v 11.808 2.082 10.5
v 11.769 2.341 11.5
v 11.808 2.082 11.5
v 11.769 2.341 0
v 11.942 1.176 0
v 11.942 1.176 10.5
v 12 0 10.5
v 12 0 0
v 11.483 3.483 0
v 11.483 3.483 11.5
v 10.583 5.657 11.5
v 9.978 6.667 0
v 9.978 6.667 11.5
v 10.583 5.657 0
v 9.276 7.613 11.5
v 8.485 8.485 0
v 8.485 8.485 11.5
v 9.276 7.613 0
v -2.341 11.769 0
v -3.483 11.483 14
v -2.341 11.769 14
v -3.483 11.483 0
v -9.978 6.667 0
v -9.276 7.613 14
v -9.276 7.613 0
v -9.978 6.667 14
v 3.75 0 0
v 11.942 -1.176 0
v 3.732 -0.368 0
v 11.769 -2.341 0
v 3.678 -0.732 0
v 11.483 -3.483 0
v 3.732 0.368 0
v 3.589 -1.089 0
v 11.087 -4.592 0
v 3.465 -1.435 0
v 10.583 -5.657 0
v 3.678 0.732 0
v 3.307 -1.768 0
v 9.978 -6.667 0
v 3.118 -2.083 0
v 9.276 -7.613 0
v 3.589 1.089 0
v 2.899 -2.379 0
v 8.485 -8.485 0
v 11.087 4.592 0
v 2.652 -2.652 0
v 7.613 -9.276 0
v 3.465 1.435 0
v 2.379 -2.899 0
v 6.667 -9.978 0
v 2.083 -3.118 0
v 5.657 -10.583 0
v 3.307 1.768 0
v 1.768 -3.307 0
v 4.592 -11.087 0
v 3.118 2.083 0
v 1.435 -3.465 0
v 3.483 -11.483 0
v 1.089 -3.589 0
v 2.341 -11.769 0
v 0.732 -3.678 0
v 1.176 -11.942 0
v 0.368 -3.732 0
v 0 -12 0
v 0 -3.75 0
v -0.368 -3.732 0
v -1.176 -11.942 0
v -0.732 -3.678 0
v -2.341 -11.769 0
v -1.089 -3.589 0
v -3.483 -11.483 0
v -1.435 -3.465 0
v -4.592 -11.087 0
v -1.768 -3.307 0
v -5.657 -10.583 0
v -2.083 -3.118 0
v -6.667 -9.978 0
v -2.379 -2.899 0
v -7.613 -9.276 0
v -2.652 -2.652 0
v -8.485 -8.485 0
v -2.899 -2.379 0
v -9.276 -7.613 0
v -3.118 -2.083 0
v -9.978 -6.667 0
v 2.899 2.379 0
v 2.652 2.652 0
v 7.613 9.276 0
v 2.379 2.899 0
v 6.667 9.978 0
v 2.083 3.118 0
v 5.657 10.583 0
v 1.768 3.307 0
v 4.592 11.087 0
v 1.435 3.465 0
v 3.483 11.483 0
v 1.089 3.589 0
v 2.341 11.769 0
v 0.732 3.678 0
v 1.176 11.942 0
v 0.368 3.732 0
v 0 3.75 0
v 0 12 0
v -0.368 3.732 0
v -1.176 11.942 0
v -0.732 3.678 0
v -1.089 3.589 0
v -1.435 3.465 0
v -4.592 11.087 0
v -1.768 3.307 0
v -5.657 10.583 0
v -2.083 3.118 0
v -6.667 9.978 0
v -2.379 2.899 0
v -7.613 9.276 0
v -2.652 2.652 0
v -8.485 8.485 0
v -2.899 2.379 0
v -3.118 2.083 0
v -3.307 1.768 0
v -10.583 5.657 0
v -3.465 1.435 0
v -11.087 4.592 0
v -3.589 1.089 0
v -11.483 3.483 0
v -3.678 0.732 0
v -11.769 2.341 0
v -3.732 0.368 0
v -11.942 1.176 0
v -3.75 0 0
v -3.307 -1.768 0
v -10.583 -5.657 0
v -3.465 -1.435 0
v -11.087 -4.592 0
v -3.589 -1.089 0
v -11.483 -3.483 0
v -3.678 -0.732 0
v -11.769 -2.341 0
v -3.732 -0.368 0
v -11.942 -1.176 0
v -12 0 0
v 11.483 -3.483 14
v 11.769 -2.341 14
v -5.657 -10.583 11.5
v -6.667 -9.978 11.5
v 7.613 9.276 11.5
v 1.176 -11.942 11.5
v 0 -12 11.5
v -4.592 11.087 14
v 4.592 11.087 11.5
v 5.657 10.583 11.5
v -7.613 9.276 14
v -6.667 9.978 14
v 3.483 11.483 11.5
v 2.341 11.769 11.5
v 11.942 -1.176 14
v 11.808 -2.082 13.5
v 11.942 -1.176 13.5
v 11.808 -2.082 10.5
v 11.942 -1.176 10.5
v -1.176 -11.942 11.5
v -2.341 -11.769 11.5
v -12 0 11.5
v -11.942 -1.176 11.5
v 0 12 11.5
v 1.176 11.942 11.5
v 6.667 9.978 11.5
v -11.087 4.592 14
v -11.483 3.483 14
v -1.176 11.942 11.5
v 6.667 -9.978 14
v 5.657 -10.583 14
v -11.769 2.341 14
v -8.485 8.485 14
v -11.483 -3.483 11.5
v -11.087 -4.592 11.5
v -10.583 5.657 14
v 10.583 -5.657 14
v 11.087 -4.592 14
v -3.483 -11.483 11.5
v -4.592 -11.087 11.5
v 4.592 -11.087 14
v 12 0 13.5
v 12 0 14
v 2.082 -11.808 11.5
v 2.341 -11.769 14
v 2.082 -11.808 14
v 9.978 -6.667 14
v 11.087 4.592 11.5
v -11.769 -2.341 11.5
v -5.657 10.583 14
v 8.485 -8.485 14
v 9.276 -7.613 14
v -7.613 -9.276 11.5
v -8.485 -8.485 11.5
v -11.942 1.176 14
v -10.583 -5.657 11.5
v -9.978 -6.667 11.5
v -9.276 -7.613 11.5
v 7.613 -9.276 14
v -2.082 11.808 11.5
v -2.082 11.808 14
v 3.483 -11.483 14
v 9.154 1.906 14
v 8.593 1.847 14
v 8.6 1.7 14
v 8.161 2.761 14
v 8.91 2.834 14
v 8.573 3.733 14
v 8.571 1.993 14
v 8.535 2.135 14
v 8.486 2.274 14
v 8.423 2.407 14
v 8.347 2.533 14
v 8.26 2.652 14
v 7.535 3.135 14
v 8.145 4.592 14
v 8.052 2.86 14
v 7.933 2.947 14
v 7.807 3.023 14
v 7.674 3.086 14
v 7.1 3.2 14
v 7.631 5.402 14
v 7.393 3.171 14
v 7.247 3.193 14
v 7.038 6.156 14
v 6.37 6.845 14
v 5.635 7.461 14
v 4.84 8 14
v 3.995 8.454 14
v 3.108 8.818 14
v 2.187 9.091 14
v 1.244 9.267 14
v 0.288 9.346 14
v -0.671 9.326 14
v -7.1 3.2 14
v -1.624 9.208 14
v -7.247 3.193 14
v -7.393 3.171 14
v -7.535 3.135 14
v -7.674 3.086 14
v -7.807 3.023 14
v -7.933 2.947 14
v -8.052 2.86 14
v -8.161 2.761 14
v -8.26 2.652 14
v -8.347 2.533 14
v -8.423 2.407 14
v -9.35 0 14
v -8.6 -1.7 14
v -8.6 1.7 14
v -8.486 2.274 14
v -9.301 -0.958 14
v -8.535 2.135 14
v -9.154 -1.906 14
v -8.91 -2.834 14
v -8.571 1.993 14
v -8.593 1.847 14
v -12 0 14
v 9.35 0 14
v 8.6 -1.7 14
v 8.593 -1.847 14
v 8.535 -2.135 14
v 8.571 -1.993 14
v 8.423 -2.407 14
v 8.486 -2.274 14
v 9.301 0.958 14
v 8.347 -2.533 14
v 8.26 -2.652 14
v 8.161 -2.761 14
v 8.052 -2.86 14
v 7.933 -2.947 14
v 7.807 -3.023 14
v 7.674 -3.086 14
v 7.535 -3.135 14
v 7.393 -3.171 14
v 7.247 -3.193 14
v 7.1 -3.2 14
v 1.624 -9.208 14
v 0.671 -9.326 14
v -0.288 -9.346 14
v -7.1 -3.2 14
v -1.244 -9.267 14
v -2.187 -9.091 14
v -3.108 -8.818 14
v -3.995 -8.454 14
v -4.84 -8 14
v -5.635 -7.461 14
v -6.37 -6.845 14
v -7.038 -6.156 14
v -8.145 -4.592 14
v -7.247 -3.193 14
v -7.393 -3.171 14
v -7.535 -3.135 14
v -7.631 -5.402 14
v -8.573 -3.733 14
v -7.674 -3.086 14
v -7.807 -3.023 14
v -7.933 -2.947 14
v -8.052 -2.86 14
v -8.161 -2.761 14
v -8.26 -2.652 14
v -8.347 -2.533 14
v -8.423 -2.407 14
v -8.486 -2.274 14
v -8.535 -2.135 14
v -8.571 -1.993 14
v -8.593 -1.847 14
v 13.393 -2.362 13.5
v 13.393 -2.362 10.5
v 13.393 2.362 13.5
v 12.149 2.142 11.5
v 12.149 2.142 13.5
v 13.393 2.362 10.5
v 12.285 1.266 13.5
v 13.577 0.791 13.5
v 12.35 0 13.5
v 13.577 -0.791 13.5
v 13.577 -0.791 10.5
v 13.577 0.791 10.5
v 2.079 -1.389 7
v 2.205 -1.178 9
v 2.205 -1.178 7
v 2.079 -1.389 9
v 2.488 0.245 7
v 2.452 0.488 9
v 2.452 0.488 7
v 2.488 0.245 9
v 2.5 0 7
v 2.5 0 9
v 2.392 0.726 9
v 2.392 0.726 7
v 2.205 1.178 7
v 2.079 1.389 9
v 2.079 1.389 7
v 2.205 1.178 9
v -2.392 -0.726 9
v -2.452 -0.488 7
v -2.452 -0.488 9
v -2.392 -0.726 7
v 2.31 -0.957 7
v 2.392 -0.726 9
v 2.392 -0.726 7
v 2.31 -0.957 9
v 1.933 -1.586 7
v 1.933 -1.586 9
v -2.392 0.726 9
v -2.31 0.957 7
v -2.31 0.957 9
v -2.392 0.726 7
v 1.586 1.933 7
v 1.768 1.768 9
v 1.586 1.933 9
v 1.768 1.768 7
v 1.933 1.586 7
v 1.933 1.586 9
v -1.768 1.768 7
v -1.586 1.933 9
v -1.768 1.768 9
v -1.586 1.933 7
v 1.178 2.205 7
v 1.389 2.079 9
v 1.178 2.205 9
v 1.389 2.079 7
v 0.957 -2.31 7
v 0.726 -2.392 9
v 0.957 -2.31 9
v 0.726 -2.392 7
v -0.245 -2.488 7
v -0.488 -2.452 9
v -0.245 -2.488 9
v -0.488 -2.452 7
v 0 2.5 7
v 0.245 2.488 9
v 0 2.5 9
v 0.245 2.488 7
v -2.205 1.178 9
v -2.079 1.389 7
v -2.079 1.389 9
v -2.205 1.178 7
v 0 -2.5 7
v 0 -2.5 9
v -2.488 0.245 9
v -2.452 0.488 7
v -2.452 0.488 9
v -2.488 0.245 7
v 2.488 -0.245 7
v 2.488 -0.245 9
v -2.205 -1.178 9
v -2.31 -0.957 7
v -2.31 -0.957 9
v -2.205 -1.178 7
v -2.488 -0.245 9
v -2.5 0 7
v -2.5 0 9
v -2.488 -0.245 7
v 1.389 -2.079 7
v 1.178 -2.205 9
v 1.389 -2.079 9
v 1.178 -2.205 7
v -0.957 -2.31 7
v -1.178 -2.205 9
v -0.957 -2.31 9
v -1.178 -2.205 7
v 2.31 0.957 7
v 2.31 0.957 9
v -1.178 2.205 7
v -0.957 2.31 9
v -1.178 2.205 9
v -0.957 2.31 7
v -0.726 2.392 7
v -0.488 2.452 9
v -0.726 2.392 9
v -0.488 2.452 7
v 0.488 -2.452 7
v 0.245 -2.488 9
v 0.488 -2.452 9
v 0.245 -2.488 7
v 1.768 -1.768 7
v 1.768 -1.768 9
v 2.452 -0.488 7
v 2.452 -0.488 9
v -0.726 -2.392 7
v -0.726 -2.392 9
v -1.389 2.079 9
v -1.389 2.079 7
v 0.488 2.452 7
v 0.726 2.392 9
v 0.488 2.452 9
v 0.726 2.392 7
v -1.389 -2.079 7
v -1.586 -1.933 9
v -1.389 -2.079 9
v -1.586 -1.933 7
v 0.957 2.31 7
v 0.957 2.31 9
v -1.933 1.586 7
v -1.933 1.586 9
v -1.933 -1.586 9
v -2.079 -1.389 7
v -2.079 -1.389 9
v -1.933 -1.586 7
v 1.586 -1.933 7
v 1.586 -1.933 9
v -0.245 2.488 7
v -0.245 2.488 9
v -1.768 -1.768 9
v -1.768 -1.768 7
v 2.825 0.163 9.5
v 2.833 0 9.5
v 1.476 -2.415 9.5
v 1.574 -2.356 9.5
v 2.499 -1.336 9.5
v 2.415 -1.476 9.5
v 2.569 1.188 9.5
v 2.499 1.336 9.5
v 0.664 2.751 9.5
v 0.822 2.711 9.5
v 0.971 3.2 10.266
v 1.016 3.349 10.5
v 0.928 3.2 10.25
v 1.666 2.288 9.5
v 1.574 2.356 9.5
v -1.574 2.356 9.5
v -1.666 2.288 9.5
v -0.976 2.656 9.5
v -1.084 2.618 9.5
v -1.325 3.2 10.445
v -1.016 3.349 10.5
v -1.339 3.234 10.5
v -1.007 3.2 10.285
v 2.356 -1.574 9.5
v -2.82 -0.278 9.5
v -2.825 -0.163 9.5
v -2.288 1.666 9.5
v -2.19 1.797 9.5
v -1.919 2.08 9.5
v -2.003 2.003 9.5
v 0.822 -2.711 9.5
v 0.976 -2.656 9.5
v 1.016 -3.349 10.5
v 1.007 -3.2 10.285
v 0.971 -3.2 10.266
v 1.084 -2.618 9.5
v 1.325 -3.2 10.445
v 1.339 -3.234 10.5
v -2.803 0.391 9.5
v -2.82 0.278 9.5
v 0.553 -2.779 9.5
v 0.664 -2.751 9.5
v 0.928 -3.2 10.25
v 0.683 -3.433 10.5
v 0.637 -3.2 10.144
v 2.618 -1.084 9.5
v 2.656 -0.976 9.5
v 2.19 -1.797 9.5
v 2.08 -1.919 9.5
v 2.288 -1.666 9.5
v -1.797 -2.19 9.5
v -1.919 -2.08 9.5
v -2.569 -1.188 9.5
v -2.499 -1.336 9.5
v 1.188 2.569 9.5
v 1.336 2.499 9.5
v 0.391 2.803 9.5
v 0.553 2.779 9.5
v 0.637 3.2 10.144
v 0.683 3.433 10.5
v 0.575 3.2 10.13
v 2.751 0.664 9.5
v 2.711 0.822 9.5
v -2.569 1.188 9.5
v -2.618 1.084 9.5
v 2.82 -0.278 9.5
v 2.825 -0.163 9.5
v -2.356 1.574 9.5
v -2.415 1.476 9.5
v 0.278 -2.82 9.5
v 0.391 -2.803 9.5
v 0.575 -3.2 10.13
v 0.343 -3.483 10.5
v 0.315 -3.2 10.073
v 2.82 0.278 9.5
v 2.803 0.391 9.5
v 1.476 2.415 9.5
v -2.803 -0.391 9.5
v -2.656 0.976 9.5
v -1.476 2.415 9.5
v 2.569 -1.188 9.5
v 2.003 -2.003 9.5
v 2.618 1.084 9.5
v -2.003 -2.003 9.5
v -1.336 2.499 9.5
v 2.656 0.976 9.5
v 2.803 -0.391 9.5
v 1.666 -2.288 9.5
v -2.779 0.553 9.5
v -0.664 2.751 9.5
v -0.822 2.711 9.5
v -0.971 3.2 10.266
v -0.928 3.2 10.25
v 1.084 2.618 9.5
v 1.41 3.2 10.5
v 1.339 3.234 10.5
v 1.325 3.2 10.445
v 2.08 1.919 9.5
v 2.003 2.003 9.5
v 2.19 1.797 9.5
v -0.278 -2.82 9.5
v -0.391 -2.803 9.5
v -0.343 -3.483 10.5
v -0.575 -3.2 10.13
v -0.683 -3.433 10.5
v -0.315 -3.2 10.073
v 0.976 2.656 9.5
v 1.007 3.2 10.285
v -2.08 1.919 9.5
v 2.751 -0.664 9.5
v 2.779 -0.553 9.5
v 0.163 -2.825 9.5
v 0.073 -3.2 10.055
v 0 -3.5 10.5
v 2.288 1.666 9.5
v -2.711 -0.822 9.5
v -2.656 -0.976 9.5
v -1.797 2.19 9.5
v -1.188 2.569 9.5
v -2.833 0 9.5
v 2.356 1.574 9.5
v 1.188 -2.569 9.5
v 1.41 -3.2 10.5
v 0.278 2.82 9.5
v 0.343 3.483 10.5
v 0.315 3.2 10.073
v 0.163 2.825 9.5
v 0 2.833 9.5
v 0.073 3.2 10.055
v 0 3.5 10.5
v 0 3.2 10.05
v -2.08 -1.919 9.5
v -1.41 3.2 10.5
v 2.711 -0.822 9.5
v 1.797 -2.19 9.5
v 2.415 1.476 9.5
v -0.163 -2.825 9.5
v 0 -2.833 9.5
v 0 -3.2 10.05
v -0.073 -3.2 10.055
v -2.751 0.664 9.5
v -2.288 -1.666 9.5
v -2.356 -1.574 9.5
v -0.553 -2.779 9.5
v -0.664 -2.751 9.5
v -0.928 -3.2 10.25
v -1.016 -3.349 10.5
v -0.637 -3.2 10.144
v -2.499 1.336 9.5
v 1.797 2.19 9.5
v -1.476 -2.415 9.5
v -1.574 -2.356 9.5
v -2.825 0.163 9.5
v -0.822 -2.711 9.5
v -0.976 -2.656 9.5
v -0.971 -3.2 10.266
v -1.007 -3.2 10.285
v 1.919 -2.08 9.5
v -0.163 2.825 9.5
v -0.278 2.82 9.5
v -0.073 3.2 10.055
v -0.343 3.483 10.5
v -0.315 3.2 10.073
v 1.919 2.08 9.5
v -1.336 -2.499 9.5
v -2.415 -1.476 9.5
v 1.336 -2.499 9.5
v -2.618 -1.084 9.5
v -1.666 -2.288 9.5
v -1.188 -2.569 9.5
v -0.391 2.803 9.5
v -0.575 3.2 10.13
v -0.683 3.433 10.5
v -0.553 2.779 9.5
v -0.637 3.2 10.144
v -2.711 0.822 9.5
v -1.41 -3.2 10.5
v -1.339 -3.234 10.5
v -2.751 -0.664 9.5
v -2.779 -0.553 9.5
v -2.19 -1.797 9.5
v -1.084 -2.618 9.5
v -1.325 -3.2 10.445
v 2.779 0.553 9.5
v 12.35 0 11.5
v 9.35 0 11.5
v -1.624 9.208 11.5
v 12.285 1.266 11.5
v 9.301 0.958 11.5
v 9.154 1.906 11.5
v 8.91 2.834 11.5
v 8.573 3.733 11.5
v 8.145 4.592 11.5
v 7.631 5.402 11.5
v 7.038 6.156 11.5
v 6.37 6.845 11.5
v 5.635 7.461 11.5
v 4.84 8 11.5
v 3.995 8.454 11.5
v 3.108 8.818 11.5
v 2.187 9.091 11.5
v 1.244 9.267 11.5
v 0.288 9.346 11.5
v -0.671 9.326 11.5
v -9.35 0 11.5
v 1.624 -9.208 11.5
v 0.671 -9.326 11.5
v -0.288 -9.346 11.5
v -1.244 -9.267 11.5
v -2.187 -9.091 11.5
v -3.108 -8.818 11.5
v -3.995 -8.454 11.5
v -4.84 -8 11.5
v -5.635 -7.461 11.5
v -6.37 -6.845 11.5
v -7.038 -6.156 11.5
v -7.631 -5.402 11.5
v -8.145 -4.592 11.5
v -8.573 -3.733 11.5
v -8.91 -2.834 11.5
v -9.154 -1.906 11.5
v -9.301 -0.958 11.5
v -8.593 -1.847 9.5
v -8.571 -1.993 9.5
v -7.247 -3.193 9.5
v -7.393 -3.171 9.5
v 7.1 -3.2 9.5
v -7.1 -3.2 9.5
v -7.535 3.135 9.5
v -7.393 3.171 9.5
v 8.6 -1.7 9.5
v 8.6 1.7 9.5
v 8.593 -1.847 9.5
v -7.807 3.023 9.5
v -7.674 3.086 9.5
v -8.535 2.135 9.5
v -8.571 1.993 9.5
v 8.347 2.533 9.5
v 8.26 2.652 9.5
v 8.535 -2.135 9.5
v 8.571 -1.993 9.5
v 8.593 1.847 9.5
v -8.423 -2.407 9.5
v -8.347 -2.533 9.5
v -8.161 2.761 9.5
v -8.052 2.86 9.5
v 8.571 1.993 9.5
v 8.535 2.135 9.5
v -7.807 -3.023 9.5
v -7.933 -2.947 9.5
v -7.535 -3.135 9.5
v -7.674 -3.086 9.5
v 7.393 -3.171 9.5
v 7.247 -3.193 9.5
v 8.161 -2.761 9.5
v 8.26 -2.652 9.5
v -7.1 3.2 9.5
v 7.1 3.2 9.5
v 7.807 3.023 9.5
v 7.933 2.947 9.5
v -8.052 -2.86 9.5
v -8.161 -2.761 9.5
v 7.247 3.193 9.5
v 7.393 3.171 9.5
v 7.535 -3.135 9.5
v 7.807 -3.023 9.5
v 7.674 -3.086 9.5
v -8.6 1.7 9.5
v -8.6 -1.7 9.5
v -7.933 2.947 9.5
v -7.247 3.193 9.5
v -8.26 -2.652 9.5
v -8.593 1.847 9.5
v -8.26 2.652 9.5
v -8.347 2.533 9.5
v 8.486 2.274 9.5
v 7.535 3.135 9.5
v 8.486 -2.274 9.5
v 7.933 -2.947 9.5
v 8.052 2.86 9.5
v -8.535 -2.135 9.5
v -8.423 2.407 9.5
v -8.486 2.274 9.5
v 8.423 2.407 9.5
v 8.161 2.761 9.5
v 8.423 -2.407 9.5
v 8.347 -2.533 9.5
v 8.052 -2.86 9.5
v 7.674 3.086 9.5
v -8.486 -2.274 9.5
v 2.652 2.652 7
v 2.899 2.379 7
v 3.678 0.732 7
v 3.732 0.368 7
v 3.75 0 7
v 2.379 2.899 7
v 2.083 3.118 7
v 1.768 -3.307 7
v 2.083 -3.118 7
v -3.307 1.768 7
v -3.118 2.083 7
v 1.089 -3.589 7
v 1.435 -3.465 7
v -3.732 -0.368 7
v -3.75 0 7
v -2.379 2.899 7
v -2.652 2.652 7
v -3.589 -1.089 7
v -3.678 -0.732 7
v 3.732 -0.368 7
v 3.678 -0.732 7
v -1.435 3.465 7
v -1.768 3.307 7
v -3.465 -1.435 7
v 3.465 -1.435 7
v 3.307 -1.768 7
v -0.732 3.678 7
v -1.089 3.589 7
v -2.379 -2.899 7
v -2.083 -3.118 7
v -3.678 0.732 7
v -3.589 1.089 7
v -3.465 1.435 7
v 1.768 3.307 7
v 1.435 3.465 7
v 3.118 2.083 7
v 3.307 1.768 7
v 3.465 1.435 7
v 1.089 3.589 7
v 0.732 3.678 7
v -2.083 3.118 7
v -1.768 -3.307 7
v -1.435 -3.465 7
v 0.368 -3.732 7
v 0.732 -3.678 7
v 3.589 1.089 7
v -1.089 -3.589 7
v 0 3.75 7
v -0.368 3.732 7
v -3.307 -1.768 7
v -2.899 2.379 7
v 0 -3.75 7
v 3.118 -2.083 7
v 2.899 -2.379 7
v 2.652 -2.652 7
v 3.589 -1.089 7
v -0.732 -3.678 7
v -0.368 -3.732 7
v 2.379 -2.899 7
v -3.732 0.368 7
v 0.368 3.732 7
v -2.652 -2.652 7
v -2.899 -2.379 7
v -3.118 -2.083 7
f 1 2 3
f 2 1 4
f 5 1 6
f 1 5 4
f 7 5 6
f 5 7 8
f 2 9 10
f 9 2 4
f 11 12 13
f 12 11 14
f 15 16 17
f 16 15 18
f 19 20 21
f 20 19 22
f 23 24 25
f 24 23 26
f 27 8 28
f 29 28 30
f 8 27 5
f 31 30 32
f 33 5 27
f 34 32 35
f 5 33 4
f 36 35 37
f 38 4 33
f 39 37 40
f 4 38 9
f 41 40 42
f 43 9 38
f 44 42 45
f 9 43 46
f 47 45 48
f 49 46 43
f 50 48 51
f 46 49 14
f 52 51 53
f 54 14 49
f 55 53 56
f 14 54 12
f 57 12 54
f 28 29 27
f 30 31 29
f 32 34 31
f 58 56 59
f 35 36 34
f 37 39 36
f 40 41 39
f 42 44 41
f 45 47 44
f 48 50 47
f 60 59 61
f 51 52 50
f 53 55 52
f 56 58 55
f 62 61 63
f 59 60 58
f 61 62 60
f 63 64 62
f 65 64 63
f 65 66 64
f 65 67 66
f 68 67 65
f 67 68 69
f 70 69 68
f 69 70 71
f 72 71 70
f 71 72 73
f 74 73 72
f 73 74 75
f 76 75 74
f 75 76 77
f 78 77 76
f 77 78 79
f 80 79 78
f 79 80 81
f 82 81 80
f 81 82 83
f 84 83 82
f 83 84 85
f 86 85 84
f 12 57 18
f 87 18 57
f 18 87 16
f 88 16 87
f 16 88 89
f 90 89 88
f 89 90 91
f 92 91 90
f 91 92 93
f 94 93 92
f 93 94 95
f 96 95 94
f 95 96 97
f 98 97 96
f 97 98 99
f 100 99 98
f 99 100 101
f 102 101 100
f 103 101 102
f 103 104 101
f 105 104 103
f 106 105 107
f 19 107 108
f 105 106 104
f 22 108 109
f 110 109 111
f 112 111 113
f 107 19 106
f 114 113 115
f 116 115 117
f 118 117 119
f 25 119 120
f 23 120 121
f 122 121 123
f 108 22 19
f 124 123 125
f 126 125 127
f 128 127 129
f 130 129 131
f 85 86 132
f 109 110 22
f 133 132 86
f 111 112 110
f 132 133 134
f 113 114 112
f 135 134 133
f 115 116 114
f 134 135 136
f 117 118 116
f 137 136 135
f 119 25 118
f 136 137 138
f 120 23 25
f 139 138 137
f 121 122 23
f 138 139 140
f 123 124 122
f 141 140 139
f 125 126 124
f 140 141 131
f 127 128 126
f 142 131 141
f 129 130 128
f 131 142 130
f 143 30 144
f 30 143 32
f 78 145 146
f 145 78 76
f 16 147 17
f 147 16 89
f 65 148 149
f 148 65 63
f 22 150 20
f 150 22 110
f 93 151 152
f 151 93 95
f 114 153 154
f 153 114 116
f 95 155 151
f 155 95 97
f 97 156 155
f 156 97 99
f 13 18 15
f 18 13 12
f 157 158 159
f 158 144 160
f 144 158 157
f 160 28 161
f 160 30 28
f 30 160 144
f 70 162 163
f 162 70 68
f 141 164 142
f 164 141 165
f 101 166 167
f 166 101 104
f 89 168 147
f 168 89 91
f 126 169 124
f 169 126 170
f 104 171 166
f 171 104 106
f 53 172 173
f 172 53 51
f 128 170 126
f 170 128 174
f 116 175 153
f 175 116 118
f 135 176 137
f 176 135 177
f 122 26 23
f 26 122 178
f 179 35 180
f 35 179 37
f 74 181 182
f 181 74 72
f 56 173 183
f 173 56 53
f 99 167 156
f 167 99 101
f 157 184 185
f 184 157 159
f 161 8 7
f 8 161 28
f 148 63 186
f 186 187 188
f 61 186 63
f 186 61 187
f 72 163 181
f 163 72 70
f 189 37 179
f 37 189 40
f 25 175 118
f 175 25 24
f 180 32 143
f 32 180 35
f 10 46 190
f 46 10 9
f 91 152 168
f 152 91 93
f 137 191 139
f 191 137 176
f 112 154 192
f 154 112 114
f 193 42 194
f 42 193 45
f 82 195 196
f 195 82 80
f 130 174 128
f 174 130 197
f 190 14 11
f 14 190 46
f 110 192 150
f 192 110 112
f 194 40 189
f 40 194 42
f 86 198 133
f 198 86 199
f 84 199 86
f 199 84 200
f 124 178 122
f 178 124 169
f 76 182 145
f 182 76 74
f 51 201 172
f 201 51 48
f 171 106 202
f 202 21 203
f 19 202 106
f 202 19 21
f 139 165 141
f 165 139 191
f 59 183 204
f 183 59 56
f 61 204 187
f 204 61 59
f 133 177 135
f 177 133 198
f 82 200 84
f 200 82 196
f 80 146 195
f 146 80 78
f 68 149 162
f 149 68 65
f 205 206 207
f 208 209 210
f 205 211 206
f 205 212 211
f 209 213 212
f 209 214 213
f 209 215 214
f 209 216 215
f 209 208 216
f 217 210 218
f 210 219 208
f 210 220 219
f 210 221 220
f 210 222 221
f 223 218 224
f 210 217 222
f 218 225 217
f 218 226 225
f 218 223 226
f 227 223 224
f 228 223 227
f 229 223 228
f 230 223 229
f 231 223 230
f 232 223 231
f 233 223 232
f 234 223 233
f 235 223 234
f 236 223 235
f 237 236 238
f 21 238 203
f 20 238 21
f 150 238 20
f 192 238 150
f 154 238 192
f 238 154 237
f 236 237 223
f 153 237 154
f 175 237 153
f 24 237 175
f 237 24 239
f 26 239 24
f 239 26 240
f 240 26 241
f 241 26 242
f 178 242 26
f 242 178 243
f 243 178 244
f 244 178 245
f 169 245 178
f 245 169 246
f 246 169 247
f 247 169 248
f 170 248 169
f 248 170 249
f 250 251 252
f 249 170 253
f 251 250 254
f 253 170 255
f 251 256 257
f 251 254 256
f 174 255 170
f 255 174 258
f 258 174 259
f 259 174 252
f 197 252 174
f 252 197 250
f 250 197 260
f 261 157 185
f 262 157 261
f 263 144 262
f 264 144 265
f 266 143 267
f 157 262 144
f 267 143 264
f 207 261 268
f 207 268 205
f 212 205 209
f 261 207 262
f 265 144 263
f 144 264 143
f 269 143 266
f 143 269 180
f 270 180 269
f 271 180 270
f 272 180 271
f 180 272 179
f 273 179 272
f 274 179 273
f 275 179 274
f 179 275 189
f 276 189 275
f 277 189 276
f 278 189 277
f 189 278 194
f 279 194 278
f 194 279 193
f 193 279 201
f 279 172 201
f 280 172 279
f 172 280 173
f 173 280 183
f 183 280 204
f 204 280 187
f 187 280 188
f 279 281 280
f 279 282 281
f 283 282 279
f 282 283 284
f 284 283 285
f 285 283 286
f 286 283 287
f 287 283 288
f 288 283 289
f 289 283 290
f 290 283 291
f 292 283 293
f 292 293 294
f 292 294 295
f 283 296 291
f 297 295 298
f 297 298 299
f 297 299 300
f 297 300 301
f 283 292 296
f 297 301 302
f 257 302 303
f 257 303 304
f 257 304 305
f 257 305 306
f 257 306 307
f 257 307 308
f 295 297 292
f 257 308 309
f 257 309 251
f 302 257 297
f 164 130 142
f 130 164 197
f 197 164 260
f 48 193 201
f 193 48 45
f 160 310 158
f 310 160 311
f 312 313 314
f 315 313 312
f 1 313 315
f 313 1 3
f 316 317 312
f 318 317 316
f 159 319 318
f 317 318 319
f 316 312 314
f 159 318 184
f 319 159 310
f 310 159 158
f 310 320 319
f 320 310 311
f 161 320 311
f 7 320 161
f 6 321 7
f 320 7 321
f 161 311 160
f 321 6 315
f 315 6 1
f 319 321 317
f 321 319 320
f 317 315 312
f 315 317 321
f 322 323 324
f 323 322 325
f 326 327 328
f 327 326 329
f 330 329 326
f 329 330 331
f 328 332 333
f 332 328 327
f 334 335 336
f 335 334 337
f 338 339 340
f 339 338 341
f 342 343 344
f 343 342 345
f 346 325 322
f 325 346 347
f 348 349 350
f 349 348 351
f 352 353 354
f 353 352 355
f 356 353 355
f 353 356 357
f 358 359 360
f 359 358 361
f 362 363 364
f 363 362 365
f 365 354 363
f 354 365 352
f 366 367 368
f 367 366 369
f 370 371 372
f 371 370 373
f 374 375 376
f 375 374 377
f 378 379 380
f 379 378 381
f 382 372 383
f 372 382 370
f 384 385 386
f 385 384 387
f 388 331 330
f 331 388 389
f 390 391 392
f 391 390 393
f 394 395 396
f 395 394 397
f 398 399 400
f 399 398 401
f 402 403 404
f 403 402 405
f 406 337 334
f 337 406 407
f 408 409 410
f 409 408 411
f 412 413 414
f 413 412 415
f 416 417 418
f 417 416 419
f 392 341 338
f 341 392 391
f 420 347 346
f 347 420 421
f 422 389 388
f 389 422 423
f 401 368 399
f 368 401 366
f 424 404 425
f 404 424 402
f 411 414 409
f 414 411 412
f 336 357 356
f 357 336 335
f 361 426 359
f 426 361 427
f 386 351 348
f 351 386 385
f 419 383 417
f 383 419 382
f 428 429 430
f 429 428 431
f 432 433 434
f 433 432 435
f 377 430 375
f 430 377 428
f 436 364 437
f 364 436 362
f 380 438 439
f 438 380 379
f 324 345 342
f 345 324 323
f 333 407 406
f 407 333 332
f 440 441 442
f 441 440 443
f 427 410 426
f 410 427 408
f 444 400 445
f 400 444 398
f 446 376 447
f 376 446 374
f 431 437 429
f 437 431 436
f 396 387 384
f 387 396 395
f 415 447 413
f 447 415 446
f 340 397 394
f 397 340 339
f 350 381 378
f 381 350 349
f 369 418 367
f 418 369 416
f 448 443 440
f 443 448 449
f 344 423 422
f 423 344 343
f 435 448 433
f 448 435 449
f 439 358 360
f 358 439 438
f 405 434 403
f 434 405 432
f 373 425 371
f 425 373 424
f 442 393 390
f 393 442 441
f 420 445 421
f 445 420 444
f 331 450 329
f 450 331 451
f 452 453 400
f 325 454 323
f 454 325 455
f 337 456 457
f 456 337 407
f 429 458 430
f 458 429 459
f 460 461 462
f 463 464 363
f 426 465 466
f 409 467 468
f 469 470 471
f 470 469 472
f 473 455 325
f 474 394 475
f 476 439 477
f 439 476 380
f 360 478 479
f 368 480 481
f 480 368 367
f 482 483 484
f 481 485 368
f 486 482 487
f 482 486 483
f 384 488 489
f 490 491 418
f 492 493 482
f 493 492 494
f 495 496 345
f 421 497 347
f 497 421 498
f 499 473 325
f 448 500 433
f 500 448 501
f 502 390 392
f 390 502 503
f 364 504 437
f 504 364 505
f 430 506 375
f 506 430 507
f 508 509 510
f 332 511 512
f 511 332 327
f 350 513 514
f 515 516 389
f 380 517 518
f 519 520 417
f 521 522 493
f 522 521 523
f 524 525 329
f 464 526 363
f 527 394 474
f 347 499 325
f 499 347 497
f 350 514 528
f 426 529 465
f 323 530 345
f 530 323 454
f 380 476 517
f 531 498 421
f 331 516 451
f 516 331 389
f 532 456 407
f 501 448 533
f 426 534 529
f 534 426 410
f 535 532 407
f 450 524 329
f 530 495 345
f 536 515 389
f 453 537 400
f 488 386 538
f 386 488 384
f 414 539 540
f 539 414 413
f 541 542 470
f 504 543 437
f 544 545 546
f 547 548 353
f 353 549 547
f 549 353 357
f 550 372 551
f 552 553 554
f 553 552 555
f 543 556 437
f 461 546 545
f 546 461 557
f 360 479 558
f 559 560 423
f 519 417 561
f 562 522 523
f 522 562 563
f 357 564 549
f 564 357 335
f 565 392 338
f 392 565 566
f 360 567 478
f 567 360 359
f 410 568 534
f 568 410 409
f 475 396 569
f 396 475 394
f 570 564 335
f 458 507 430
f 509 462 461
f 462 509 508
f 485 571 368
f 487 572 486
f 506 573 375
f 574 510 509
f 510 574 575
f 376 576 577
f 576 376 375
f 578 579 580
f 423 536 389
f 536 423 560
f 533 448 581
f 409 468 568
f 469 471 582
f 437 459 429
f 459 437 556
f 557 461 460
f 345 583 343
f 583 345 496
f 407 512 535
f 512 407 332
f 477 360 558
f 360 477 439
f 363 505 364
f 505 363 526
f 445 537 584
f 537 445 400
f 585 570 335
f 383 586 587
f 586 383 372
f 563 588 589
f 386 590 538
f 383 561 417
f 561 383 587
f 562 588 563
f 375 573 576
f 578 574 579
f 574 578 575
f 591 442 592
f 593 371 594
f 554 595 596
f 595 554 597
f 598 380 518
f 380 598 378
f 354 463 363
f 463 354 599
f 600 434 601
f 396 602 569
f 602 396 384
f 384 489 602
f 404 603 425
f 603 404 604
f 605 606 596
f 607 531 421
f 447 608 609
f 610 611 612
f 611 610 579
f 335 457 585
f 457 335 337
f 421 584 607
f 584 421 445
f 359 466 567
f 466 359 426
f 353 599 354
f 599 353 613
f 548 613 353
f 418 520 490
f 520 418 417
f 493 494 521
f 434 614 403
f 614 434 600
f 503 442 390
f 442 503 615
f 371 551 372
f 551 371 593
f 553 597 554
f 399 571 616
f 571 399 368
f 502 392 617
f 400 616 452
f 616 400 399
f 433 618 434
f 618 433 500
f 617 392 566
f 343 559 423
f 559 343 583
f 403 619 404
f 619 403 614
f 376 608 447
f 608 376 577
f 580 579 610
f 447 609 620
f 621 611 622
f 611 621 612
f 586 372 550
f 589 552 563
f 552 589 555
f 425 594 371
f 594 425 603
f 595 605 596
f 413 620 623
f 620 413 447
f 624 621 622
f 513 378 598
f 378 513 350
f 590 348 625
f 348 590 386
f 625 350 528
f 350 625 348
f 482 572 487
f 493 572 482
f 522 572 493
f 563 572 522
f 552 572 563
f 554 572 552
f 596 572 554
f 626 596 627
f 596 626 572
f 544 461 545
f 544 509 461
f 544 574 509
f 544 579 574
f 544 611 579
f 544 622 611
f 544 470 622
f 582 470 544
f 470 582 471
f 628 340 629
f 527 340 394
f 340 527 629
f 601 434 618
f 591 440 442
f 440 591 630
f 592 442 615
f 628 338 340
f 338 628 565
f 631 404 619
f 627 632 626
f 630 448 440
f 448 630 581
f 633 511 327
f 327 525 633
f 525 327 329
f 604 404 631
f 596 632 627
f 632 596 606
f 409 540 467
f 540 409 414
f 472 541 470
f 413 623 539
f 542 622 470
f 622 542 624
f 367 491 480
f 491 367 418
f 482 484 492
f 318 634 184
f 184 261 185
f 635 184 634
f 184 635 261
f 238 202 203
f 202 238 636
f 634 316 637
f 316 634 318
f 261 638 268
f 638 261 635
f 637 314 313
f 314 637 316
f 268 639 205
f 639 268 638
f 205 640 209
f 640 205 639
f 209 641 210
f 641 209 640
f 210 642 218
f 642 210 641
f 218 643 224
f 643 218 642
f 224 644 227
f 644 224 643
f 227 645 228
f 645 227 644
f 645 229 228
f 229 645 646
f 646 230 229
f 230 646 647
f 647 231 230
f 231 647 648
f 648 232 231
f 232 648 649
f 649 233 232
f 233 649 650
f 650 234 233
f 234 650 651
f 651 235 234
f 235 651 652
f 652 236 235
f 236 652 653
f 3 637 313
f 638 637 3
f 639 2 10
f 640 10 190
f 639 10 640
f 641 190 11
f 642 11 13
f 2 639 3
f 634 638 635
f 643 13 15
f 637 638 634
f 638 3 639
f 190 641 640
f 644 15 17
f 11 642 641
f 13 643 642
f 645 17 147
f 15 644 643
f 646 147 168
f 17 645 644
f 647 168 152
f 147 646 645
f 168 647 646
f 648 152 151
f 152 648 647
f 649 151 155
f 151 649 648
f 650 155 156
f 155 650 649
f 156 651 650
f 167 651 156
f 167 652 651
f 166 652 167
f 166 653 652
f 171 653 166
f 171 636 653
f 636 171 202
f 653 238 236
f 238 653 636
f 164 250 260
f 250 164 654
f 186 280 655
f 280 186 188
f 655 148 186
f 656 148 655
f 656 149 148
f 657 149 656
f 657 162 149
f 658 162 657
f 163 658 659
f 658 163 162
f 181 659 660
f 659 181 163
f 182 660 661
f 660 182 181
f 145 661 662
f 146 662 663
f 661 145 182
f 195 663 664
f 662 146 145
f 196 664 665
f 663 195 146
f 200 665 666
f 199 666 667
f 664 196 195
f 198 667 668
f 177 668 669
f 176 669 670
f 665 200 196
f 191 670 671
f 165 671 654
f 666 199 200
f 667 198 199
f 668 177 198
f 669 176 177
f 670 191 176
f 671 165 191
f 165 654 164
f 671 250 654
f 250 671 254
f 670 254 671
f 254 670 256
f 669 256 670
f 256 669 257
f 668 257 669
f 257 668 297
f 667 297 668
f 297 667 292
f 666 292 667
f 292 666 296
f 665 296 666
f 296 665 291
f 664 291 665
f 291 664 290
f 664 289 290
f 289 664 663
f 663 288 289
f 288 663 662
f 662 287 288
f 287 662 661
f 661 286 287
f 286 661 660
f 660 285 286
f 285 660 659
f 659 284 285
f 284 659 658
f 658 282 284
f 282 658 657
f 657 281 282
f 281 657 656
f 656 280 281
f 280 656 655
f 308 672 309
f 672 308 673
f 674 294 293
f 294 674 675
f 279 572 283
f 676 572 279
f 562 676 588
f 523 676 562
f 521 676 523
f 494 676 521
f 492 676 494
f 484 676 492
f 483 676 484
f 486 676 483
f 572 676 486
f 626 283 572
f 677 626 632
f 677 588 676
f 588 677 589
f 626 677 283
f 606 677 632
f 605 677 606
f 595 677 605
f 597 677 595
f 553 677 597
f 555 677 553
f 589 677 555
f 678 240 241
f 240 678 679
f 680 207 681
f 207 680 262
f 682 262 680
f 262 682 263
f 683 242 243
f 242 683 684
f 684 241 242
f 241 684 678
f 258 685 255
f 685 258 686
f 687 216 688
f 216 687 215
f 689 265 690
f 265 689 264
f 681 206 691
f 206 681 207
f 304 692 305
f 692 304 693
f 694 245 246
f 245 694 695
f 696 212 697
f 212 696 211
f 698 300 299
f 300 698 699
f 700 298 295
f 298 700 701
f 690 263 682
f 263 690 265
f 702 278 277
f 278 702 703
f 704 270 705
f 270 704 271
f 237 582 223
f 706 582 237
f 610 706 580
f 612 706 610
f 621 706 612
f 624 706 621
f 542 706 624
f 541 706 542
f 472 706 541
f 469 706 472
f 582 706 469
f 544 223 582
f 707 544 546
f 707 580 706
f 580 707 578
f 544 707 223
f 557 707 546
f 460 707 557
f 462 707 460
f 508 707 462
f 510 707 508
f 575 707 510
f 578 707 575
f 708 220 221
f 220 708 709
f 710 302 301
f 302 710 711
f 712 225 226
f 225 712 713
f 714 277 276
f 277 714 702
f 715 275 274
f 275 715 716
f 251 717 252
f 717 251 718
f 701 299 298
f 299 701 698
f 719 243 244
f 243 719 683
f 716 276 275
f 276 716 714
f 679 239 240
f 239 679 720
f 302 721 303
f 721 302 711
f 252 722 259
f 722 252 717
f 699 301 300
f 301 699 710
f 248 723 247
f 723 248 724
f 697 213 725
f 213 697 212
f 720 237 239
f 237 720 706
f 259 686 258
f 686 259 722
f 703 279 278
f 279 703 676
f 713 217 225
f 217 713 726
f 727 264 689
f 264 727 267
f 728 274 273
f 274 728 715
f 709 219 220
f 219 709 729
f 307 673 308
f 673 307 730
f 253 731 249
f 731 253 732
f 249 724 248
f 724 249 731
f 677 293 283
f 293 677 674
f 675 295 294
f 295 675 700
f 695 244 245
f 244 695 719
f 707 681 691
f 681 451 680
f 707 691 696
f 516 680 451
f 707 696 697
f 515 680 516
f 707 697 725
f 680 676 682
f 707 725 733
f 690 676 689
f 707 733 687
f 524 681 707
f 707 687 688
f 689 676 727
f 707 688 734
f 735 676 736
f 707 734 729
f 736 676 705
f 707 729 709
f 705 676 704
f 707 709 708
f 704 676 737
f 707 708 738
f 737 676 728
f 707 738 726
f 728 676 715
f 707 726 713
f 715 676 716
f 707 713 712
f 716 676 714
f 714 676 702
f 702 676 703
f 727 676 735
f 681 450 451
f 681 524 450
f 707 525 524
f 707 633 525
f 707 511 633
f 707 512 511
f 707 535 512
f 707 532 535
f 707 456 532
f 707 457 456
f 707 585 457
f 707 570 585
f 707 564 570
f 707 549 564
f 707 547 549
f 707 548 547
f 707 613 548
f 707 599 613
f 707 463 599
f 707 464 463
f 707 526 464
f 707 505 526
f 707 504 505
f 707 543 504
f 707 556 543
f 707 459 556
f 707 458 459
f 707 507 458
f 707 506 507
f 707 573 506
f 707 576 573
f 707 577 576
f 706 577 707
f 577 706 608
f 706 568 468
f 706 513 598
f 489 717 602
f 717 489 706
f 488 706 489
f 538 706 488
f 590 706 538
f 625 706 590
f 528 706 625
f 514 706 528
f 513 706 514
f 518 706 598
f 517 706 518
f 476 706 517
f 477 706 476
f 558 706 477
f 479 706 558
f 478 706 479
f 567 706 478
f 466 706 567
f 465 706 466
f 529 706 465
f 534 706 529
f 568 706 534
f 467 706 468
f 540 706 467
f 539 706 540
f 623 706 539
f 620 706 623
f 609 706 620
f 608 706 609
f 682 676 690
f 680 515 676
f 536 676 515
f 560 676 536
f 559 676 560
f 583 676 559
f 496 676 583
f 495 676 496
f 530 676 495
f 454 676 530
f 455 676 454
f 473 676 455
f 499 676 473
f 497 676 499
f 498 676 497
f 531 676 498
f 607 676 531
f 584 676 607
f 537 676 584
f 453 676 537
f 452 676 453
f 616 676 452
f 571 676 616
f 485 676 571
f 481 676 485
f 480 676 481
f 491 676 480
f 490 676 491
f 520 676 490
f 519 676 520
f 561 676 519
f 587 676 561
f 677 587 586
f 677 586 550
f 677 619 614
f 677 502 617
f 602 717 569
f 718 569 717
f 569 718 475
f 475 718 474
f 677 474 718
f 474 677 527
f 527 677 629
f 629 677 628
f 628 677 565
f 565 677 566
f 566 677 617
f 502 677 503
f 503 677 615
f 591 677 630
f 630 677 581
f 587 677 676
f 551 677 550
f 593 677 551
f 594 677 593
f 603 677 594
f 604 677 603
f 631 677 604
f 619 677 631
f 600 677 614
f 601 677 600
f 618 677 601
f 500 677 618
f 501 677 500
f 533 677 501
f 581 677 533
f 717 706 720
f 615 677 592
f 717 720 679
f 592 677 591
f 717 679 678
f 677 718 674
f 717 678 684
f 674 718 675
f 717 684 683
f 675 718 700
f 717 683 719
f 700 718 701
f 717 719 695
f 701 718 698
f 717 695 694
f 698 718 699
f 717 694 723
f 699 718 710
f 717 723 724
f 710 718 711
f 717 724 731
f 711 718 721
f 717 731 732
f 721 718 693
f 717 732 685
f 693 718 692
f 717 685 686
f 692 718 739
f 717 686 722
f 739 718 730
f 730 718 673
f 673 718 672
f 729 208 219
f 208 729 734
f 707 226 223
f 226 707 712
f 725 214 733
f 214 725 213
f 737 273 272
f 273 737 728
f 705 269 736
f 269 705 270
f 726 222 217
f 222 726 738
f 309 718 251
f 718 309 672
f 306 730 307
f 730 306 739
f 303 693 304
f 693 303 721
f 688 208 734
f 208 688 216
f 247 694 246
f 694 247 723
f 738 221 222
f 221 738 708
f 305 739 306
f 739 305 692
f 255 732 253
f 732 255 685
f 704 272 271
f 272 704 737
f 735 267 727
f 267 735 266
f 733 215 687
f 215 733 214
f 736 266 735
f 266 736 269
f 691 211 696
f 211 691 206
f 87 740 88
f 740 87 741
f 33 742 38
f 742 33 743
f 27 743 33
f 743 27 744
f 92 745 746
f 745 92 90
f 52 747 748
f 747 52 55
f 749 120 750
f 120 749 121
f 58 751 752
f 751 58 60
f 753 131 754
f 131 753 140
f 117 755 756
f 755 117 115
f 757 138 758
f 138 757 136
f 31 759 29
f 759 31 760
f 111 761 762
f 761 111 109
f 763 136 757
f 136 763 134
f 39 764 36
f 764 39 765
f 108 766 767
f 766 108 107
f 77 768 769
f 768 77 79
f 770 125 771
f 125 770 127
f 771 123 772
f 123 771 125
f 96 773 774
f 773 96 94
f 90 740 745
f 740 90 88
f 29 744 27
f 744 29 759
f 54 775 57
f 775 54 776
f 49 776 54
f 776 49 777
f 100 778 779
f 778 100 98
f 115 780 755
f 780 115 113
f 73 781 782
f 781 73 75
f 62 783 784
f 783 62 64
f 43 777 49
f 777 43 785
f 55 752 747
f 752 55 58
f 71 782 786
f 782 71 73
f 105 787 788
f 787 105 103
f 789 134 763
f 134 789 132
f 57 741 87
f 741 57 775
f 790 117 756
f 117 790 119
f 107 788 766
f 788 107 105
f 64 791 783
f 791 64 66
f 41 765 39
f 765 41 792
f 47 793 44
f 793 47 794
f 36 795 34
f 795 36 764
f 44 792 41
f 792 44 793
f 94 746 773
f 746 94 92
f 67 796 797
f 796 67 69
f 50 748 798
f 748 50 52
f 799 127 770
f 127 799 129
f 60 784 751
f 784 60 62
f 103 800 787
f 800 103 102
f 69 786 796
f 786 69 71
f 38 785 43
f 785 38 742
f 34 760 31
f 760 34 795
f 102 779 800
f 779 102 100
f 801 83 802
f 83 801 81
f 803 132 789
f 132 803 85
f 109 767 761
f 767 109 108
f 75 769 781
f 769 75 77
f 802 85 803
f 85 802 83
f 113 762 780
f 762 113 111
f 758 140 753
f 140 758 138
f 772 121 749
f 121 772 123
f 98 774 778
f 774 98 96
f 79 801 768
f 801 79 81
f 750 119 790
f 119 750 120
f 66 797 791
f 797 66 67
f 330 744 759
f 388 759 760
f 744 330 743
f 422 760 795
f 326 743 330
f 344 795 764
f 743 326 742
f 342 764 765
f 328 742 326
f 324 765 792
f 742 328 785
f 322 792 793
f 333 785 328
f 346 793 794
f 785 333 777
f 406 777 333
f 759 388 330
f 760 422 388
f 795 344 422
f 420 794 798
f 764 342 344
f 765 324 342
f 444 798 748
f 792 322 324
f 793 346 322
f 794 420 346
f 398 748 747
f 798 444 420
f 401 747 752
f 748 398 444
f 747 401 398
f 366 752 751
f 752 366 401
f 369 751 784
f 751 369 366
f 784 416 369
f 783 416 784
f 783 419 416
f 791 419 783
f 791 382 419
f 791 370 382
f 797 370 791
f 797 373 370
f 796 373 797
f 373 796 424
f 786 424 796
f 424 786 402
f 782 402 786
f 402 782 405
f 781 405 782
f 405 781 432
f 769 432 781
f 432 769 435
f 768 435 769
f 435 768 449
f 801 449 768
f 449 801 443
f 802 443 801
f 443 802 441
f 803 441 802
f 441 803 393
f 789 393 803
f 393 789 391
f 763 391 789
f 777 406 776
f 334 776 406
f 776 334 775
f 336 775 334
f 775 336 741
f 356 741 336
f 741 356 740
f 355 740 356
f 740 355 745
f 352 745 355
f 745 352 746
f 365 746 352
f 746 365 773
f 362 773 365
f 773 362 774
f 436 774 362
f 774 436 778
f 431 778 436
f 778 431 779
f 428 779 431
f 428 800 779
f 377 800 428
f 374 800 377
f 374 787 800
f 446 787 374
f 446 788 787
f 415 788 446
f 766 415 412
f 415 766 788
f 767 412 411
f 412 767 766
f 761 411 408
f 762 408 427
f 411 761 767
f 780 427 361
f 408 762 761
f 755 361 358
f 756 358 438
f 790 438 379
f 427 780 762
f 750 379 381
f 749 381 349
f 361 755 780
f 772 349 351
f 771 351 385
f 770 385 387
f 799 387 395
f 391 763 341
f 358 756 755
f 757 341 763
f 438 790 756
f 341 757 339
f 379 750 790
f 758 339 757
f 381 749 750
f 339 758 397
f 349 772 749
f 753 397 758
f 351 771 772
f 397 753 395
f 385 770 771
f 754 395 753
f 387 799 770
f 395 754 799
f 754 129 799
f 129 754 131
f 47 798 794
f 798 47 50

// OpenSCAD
//==================================================
// CRYSTAL FOOT — v2, now standalone (no more fused shaft)
//
// FIX: the old combined foot+transition+shaft was one rigid piece.
// The transition cone (up to 24mm wide, tapering to 8mm) had to
// physically pass through the shell's 9mm shaft passage for the top
// lugs (then on the foot) to ever reach the collar -- impossible for
// a solid cone that wide. That's why the lug never hit the notch.
//
// Fix: foot and shaft are now separate parts (see crystal_shaft_v1.
// scad). The bare shaft -- always thin, no wide taper -- slides
// through the shell easily and locks via its own lugs. THIS foot
// then press-fits onto the shaft's exposed bottom end afterward,
// via the socket at the top.
//
// Mechanism (bottom lug, disc lock) unchanged from before:
//   1. Foot inserts straight down through the ring's hole.
//   2. Rotates 90° (single asymmetric lug).
//   3. Lug seats under the disc's retaining lip.
//   4. At the 90° end-stop, the pad connector aligns with the disc's
//      fixed pin connector -- mechanical lock and electrical contact
//      complete at the same motion.
//
// ONE lug, not two symmetric ones — deliberate. A symmetric pair
// would let the foot lock at either of two rotations 180° apart,
// and since the pad row isn't symmetric, the 180°-flipped case would
// scramble GND/5V/DATA. One lug = one valid orientation.
//==================================================

$fn = 64;

/* [Foot] */
foot_diameter   = 24;
foot_length     = 14;

/* [Bayonet lug — disc lock, unchanged] */
lug_width_deg   = 20;
lug_thickness   = 1.6;
lug_height      = 3;
lug_z           = 10.5;

/* [Pad connector pocket — all measured, unchanged] */
pad_length    = 17;
pad_height    = 4.5;
pad_width     = 6.2;
pad_clearance = 0.1;
pad_corner_r  = 1.5;

/* [Peg relief — clears the disc's alignment pegs, unchanged] */
/* [Peg relief — FIXED: was plain round holes, which only give
   clearance at ONE rotational position. Since the foot actually
   ROTATES 90° (entry -90° to locked 0°) while the disc's alignment
   pegs stay FIXED in place, round holes physically block that
   rotation once the foot moves away from wherever the hole happened
   to be positioned -- confirmed as the actual "foot can't rotate"
   bug. Fixed: arc-shaped slots spanning the full 90° of travel, with
   a few degrees of margin each end for reliable clearance. */
peg_hole_spacing = 21.7;
peg_arc_width_deg = 100;   // 90° rotation + 10° margin
peg_hole_depth   = 2.5;
peg_slot_radial_width = 3;  // radial width of the slot (was a
                             // 2.5mm round hole -- this is the
                             // equivalent radial clearance)

module peg_relief_holes()
{
    for (a = [0, 180])
        rotate([0, 0, a])
            translate([0, 0, foot_length - peg_hole_depth])
                rotate_extrude(angle = peg_arc_width_deg)
                    translate([peg_hole_spacing/2 - peg_slot_radial_width/2, 0])
                        square([peg_slot_radial_width, peg_hole_depth + 1]);
}

module rounded_rect_prism(l, w, h, r)
{
    hull()
    {
        for (x = [-l/2 + r, l/2 - r])
            for (y = [-w/2 + r, w/2 - r])
                translate([x, y, 0])
                    cylinder(h = h, r = r);
    }
}

/* [Wire channel through the foot, unchanged] */
wire_channel_dia = 5.0;
chamfer_height = 1.5;
chamfer_extra  = 2;

module wire_channel_lower()
{
    // straight bore + funnel chamfer down into the pocket, same as
    // before, but now it needs to reach UP to meet the socket instead
    // of a theoretical "future shaft"
    main_h = foot_length - pad_height + 1 - chamfer_height;
    union()
    {
        cylinder(h = main_h, d = wire_channel_dia);
        translate([0, 0, main_h])
            cylinder(h = chamfer_height,
                      d1 = wire_channel_dia,
                      d2 = wire_channel_dia + chamfer_extra);
    }
}

module foot_shaft()
{
    cylinder(h = foot_length, d = foot_diameter);
}

module bayonet_lug()
{
    rotate([0, 0, -lug_width_deg/2])
        rotate_extrude(angle = lug_width_deg)
            translate([foot_diameter/2 - 0.5, lug_z])
                square([lug_thickness + 0.5, lug_height]);
}

module pad_pocket()
{
    translate([0, 0, foot_length - pad_height])
        rounded_rect_prism(pad_length + pad_clearance*2,
                            pad_width + pad_clearance*2,
                            pad_height + 1,
                            pad_corner_r);
}

/* [Press-fit socket — WIDENED. The old 6mm socket/peg had a 5mm wire
   channel bored through its own center, leaving only ~0.4mm of wall
   -- too thin to print reliably, and left no room for the wire
   bundle (already threaded through this channel) to coexist with a
   peg trying to occupy the same space. That's why there wasn't
   enough room to actually mount the shaft.
   MATCH crystal_shaft_v1.scad's peg_diameter=7.5, peg_length=7.
*/
socket_dia    = 7.5;   // was 6
socket_depth  = 7.5;

module press_fit_socket()
{
    translate([0, 0, -0.5])
        cylinder(h = socket_depth, d = socket_dia);
}

module foot()
{
    difference()
    {
        union()
        {
            foot_shaft();
            bayonet_lug();
        }
        pad_pocket();
        wire_channel_lower();
        peg_relief_holes();
        press_fit_socket();
    }
}

foot();
